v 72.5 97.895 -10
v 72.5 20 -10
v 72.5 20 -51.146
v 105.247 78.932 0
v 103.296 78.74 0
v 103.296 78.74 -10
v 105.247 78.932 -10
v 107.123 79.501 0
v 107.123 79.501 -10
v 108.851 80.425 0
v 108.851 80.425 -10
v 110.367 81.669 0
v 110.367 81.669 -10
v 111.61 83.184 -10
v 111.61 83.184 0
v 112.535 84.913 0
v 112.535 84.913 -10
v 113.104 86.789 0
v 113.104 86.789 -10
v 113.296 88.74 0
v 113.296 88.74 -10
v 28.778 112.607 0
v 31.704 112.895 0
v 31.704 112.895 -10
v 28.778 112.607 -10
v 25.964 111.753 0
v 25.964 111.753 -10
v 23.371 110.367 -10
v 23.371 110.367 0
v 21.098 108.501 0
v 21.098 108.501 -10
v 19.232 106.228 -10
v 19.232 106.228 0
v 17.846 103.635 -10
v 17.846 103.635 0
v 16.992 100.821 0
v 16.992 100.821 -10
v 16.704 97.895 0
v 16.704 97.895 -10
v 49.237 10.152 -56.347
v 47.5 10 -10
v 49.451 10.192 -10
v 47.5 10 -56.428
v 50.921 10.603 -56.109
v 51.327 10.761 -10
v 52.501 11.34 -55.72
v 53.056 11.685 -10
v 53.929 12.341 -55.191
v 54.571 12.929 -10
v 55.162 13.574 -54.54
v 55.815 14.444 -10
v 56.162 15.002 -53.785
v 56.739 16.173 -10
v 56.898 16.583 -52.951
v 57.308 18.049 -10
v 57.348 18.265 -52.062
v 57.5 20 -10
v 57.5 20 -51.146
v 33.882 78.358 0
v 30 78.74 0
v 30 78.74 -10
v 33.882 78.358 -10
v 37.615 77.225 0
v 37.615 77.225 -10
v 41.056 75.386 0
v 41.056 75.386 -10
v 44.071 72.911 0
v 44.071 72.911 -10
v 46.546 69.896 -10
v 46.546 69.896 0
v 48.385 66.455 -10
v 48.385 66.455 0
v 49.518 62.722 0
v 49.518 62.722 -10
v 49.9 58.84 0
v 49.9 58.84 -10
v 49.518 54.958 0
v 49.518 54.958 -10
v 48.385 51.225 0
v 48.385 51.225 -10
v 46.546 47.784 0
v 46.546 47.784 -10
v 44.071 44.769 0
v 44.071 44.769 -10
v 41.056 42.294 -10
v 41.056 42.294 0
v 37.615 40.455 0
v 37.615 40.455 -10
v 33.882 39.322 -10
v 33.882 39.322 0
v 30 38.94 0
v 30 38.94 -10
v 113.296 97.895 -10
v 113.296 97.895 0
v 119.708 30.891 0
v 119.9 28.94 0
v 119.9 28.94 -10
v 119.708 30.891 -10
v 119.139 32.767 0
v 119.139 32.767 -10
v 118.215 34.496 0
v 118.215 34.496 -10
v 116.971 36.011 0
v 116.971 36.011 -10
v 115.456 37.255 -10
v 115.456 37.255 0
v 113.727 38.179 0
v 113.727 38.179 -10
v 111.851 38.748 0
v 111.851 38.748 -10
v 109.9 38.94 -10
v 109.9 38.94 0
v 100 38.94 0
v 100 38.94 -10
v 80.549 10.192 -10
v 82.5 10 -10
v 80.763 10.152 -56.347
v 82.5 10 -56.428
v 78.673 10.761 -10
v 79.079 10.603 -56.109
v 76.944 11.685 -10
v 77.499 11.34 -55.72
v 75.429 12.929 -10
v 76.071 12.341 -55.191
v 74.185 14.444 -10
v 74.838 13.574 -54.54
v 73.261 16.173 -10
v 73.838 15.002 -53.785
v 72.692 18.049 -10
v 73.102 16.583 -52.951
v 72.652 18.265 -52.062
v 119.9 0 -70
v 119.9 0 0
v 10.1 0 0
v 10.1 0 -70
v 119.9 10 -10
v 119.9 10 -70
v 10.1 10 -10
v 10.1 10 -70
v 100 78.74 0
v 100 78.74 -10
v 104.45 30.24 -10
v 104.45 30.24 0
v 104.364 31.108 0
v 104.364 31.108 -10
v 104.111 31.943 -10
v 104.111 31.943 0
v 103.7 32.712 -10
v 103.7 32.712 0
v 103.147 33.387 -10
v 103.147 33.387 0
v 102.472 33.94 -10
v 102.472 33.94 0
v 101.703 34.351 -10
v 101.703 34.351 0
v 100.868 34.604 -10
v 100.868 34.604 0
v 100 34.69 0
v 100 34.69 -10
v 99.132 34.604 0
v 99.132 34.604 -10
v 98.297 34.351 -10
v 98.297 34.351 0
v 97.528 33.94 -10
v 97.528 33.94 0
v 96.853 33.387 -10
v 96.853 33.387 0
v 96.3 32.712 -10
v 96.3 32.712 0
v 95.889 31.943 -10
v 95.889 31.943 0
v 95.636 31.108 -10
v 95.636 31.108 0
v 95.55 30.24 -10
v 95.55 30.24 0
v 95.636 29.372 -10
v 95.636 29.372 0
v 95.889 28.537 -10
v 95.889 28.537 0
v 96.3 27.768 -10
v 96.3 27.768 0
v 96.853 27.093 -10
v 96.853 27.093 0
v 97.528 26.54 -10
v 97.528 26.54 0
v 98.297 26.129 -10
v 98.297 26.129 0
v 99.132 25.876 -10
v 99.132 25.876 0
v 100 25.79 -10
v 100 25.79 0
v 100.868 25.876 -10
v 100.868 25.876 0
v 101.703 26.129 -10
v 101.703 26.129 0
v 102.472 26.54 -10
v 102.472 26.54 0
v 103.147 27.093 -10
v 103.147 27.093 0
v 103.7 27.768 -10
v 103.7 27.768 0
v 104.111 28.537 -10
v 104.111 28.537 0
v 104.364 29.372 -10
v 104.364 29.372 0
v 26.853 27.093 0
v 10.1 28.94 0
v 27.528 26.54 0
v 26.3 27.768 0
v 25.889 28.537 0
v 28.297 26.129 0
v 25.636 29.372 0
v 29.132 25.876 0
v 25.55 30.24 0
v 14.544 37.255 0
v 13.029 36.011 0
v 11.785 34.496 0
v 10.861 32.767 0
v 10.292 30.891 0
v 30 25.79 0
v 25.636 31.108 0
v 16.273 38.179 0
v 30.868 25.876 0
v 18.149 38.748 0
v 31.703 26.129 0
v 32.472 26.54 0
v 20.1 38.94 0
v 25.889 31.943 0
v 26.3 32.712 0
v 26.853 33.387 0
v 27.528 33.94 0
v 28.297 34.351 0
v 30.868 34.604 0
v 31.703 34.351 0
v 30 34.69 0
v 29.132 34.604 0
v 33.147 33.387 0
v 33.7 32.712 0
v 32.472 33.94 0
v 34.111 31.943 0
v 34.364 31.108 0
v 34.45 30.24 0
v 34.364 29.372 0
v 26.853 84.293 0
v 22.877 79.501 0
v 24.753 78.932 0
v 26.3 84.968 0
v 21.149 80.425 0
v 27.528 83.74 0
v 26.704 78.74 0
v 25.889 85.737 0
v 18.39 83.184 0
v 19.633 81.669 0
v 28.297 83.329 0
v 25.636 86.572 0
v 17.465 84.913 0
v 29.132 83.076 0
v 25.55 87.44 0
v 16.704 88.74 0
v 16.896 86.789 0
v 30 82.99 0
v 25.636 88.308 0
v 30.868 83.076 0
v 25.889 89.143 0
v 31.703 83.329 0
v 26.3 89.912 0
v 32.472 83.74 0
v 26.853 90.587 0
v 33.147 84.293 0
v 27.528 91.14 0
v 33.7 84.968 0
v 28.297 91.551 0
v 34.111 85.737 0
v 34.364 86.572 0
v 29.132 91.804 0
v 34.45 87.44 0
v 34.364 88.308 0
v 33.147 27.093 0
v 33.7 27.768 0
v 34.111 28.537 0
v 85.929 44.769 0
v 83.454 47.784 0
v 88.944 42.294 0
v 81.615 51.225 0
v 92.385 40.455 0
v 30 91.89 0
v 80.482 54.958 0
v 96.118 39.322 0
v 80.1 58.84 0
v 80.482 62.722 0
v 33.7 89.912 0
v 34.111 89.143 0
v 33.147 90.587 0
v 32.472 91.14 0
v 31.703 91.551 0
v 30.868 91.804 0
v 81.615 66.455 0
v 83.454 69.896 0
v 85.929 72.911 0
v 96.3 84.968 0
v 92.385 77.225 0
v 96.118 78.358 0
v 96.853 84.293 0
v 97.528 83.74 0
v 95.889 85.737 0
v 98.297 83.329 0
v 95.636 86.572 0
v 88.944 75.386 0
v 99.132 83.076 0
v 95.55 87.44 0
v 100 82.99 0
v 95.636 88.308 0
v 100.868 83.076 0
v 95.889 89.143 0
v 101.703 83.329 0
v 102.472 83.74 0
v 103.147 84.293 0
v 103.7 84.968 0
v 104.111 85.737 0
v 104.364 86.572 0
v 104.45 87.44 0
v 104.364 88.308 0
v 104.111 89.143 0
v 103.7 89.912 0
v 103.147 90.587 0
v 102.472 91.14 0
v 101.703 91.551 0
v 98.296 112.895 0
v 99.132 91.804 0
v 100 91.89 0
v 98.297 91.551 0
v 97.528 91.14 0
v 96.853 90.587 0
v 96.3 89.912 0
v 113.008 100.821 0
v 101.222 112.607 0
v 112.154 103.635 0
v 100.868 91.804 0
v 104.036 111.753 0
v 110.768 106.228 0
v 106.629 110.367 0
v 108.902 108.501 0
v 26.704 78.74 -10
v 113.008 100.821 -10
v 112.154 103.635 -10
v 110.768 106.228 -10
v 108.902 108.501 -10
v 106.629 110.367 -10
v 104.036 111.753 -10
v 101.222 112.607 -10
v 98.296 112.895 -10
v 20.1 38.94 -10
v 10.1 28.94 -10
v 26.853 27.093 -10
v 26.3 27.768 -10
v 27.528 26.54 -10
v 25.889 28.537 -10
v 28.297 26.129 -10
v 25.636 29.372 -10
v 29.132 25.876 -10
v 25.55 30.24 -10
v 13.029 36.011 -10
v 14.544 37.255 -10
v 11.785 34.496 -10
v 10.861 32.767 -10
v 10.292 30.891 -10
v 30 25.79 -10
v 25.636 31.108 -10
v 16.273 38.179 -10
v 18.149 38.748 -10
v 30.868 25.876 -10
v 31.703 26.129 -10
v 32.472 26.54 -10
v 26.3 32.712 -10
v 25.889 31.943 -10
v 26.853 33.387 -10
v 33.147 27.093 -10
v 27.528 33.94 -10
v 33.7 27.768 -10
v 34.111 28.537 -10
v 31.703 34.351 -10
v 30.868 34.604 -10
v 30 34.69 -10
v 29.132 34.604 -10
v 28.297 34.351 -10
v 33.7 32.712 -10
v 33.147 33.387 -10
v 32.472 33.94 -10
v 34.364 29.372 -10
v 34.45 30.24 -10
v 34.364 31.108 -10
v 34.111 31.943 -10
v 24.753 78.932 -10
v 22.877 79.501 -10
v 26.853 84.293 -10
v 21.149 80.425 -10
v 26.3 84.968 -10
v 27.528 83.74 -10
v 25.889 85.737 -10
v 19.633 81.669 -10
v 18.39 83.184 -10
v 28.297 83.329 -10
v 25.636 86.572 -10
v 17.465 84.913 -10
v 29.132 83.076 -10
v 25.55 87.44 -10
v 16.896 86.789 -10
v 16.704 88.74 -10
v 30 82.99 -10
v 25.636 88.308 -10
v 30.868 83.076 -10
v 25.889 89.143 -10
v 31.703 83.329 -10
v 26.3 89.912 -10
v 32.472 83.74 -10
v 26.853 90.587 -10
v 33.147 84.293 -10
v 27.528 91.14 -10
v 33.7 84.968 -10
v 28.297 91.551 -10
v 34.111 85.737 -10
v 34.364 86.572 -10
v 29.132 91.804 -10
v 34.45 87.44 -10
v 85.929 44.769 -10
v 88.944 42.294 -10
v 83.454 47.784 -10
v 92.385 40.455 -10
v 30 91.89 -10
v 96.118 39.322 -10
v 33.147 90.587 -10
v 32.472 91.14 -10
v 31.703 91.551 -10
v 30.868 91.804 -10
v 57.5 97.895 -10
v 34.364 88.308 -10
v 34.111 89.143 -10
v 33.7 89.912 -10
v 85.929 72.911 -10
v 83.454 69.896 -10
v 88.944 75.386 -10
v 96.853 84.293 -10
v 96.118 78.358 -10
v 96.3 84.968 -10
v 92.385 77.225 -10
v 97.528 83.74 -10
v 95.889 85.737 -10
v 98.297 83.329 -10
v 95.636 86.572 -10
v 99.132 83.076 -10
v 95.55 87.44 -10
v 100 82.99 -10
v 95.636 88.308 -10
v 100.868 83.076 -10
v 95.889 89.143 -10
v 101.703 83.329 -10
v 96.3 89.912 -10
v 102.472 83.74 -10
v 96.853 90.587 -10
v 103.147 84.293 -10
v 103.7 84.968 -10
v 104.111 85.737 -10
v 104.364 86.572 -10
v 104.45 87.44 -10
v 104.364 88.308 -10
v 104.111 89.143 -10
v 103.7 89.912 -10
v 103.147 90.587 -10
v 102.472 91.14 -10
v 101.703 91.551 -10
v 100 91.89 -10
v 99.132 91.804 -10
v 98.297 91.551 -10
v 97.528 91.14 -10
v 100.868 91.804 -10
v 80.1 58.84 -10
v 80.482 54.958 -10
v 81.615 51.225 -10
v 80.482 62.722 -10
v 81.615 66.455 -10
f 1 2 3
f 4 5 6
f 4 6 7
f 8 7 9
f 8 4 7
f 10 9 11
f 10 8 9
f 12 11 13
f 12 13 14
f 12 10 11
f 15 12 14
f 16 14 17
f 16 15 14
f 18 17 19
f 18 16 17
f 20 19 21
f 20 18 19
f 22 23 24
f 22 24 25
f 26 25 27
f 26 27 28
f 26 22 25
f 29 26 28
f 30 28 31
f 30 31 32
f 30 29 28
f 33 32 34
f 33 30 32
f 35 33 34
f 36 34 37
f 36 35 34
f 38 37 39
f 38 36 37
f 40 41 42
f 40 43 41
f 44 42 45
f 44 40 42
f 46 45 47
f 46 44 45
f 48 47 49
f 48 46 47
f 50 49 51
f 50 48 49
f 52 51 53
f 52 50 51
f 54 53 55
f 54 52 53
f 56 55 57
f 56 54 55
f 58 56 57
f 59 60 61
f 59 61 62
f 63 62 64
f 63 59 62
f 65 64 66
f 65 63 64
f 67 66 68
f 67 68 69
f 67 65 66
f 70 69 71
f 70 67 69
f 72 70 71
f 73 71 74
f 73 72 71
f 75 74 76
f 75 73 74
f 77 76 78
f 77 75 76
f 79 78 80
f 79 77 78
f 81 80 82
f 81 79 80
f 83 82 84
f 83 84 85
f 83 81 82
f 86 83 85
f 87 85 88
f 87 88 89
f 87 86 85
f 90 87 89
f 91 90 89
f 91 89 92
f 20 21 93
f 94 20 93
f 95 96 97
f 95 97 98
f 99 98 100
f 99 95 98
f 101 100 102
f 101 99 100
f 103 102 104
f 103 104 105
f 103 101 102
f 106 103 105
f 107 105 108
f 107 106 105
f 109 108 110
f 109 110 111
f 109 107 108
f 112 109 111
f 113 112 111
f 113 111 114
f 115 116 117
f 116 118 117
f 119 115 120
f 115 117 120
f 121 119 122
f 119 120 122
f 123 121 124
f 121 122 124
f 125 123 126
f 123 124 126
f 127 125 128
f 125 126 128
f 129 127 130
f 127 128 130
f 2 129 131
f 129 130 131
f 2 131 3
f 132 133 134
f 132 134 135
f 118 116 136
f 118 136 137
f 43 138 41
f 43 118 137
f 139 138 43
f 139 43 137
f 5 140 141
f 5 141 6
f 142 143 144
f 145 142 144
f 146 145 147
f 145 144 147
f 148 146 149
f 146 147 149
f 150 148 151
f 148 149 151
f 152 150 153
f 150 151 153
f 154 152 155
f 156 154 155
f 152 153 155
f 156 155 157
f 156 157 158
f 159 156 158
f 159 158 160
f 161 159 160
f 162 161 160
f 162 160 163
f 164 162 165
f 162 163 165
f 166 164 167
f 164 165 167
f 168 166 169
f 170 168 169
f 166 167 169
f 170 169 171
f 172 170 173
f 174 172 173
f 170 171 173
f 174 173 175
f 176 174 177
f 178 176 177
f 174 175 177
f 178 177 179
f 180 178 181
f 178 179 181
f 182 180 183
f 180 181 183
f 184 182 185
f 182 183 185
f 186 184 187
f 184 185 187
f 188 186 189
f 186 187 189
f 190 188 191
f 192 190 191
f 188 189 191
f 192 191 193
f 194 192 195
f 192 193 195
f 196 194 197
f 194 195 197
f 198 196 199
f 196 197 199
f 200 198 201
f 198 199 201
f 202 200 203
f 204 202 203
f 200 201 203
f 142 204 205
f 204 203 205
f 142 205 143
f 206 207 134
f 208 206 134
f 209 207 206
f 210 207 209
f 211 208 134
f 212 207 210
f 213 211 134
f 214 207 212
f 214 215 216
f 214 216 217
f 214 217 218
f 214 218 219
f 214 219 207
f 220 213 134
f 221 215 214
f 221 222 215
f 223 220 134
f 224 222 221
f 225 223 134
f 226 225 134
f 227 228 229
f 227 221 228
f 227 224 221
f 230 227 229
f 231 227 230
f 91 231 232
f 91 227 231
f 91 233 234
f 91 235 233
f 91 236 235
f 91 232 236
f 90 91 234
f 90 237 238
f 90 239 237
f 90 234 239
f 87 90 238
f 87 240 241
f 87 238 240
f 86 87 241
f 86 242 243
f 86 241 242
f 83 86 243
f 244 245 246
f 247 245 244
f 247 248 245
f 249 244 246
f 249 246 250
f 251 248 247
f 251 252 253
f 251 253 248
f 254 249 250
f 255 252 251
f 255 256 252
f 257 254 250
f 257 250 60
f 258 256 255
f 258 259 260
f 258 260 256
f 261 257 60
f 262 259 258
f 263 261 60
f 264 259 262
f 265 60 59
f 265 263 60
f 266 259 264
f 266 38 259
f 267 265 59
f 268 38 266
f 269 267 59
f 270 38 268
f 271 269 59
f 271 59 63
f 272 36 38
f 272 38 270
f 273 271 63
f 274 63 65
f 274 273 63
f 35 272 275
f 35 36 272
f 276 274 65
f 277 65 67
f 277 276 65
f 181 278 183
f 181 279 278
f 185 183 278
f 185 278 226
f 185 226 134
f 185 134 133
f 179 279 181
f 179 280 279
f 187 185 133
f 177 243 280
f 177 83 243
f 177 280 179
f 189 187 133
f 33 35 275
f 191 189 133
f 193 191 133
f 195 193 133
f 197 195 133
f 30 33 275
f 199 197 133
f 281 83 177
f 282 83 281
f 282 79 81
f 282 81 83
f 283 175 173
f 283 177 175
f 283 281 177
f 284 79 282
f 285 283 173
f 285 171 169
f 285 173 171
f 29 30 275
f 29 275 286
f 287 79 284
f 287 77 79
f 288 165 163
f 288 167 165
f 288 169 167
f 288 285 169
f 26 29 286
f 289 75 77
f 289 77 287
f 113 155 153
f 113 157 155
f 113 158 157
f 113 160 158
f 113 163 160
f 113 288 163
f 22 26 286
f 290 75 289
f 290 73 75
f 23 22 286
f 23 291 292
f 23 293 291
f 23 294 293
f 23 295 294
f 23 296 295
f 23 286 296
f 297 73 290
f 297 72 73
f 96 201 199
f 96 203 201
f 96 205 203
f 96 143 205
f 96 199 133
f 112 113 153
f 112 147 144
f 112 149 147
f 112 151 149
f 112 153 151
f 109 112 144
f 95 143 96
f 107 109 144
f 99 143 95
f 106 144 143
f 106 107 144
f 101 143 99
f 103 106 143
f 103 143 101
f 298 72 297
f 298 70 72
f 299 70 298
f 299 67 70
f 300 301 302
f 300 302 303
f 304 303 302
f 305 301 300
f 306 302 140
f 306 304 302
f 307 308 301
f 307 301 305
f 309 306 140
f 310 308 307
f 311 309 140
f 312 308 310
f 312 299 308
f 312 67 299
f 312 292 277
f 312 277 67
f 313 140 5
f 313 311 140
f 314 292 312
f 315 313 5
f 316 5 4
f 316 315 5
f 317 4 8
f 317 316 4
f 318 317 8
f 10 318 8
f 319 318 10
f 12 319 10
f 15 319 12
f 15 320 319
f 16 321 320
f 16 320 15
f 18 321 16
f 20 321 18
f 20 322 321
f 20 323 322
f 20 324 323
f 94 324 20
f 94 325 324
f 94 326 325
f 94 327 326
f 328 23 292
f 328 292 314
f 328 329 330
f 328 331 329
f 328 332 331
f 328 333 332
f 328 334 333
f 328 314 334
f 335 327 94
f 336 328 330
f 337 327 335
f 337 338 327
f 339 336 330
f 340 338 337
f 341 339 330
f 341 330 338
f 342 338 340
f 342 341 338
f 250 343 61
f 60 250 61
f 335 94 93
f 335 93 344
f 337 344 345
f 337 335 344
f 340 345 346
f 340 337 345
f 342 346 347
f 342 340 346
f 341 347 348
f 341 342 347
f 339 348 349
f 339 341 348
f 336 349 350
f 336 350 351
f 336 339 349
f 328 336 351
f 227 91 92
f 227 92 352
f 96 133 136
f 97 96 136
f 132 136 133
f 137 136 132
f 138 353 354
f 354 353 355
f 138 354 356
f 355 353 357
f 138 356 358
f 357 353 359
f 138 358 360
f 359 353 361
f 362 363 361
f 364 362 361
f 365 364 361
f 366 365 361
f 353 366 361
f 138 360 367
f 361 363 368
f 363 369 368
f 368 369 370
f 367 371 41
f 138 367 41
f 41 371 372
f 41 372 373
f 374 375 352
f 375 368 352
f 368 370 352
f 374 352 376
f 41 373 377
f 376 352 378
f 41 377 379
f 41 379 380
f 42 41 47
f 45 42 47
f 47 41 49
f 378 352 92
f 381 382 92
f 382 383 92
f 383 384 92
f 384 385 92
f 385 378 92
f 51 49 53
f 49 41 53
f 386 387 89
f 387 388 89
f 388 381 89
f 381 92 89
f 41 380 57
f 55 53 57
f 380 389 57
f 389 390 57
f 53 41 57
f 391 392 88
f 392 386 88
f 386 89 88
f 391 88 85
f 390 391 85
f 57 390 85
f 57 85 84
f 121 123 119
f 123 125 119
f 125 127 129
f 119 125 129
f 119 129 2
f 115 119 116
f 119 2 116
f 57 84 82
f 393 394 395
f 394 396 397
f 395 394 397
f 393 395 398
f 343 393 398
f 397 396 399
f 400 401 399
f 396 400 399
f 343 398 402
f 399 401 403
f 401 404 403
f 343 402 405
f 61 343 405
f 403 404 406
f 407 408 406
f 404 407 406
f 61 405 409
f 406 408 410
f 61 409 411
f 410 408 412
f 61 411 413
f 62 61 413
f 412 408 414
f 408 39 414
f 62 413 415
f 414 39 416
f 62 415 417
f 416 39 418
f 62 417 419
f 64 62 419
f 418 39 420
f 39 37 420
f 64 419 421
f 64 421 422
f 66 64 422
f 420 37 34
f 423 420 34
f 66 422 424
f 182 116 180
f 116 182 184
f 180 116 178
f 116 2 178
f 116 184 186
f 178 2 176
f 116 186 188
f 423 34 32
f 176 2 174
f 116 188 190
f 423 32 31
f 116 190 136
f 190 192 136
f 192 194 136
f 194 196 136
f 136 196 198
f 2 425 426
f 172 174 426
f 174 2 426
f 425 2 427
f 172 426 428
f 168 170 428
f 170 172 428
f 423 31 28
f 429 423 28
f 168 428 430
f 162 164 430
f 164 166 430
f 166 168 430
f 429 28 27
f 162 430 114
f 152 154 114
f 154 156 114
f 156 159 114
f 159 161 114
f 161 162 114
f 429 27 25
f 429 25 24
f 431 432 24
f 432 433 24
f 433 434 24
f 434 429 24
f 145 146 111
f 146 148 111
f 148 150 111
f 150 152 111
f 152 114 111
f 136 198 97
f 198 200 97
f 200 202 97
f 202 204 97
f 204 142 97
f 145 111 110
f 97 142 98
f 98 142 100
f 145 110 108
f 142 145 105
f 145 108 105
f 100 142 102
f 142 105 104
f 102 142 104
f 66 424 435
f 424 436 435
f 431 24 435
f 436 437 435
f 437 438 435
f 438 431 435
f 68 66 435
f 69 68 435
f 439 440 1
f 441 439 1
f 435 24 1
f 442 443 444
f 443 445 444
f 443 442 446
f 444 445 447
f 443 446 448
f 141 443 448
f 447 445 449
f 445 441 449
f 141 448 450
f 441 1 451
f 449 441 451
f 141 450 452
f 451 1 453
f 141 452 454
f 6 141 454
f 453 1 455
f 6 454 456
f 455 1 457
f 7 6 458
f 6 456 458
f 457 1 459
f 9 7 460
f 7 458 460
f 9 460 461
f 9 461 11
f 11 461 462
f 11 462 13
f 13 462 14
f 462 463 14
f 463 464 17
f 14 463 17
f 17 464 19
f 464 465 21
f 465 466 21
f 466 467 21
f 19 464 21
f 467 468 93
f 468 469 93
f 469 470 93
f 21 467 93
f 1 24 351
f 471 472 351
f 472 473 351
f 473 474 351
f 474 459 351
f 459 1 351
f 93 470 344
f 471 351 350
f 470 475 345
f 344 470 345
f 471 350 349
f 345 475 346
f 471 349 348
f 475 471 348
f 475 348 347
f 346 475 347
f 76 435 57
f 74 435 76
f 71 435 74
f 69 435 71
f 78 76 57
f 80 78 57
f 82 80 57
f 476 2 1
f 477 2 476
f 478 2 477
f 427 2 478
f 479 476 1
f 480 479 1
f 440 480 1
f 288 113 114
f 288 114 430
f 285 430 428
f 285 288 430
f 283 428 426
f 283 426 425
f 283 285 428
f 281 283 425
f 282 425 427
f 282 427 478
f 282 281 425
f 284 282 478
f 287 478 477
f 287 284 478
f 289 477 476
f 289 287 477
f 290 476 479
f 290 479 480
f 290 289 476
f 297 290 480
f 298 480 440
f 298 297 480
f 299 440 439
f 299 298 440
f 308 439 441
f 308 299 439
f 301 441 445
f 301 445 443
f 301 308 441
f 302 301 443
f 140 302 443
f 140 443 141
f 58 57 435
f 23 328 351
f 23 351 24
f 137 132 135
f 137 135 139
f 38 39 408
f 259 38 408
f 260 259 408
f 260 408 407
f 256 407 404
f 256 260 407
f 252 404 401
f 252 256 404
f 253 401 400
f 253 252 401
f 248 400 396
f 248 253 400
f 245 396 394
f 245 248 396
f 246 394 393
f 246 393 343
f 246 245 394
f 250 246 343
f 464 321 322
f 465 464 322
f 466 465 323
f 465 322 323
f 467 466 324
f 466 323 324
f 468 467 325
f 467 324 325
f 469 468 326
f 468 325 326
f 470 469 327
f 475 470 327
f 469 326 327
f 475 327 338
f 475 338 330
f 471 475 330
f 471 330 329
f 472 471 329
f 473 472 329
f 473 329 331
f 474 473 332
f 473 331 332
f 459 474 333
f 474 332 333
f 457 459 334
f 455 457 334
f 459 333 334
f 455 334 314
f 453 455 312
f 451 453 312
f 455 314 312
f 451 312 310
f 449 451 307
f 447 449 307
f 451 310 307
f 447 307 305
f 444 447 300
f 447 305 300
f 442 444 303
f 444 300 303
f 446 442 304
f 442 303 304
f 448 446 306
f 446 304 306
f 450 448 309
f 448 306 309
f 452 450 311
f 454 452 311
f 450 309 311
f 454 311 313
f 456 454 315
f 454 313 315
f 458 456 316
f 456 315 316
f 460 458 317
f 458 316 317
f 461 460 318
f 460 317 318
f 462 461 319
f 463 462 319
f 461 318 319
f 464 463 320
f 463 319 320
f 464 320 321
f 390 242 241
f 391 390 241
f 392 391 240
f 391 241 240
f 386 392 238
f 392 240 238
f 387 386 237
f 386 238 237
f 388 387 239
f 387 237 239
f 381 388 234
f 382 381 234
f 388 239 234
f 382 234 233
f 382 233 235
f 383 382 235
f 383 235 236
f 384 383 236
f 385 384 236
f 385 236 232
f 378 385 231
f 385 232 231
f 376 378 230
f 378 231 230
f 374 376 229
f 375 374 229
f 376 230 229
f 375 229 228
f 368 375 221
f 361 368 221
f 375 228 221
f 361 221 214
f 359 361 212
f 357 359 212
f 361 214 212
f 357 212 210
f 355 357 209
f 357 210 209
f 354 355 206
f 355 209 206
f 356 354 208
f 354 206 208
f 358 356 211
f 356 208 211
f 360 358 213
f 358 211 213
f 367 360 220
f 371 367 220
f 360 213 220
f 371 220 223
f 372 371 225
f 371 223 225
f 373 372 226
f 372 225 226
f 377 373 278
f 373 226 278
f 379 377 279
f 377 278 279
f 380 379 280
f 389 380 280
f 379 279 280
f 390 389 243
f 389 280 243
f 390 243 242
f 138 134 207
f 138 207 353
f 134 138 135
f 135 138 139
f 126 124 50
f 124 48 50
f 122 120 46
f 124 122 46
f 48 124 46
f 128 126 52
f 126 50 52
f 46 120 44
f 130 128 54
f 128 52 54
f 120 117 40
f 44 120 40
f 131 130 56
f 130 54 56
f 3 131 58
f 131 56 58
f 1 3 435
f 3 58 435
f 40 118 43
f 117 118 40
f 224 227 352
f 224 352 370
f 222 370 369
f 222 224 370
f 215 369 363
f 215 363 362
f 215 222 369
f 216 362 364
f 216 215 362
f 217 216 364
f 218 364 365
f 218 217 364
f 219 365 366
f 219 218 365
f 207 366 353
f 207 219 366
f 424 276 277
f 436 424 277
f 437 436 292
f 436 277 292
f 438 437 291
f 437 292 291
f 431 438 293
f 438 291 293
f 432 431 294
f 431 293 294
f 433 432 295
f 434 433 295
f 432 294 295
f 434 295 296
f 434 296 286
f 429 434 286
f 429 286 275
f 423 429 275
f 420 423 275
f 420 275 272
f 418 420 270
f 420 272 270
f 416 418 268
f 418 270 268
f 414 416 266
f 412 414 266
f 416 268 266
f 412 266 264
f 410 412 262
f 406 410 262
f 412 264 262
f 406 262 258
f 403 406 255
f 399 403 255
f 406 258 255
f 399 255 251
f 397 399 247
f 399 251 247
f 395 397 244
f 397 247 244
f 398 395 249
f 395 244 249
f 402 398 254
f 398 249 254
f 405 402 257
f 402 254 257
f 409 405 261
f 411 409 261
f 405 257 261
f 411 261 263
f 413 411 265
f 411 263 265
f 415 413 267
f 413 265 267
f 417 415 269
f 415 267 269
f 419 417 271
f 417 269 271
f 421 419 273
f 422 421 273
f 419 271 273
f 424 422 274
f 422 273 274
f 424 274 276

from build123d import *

# Parameters (mm, degrees)
SKETCH1_R           = 4.45
BOSS_EXTRUDE1_DEPTH = 10
BOSS_EXTRUDE2_START = 10.1
SKETCH2_W           = 60
SKETCH2_H           = 10
BOSS_EXTRUDE2_DEPTH = 109.8
BOSS_EXTRUDE3_DEPTH = 7.5
FILLET1_R           = 10
FILLET2_R           = 10


with BuildPart() as part:
    # Sketch1 → Boss-Extrude1 (new body)
    with BuildSketch(Plane.XY):
        with BuildLine():
            Line((62.029952175, 0), (119.9, 0))
            Line((119.9, 0), (119.9, 28.94))
            ThreePointArc((119.9, 28.94), (116.971067812, 36.011067812), (109.9, 38.94))
            Line((109.9, 38.94), (100, 38.94))
            ThreePointArc((100, 38.94), (80.1, 58.84), (100, 78.74))
            Line((100, 78.74), (103.295753204, 78.74))
            ThreePointArc((103.295753204, 78.74), (110.366821016, 81.668932188), (113.295753204, 88.74))
            Line((113.295753204, 88.74), (113.295753204, 97.89474782))
            ThreePointArc((113.295753204, 97.89474782), (108.902354922, 108.501349538), (98.295753204, 112.89474782))
            Line((98.295753204, 112.89474782), (31.704246796, 112.89474782))
            ThreePointArc((31.704246796, 112.89474782), (21.097645078, 108.501349538), (16.704246796, 97.89474782))
            Line((16.704246796, 97.89474782), (16.704246796, 88.74))
            ThreePointArc((16.704246796, 88.74), (19.633178984, 81.668932188), (26.704246796, 78.74))
            Line((26.704246796, 78.74), (30, 78.74))
            ThreePointArc((30, 78.74), (49.9, 58.84), (30, 38.94))
            Line((30, 38.94), (20.1, 38.94))
            ThreePointArc((20.1, 38.94), (13.028932188, 36.011067812), (10.1, 28.94))
            Line((10.1, 28.94), (10.1, 0))
            Line((10.1, 0), (62.029952175, 0))
        make_face()
        with Locations((30, 30.24)):
            Circle(SKETCH1_R, mode=Mode.SUBTRACT)
        with Locations((30, 87.44)):
            Circle(SKETCH1_R, mode=Mode.SUBTRACT)
        with Locations((100, 30.24)):
            Circle(SKETCH1_R, mode=Mode.SUBTRACT)
        with Locations((100, 87.44)):
            Circle(SKETCH1_R, mode=Mode.SUBTRACT)
    extrude(amount=-BOSS_EXTRUDE1_DEPTH)

    # Sketch2 → Boss-Extrude2 (add)
    with BuildSketch(Plane(origin=(0, 0, 0), x_dir=(0, 0, -1), z_dir=(1, 0, 0)).offset(BOSS_EXTRUDE2_START)):
        with Locations((40, 5)):
            Rectangle(SKETCH2_W, SKETCH2_H)
    extrude(amount=BOSS_EXTRUDE2_DEPTH)

    # Sketch3 → Boss-Extrude3 (add, symmetric)
    with BuildSketch(Plane.ZY.offset(-65)):
        Polygon((-10, 97.89474782), (-10, 10), (-56.427715737, 10), align=None)
    extrude(amount=BOSS_EXTRUDE3_DEPTH, both=True)

    # Fillet1
    fillet1_edges = [part.edges().sort_by_distance(p)[0] for p in [
        (72.5, 10, -33.213857868),
    ]]
    fillet(fillet1_edges, radius=FILLET1_R)

    # Fillet2
    fillet2_edges = [part.edges().sort_by_distance(p)[0] for p in [
        (57.5, 10, -33.213857868),
    ]]
    fillet(fillet2_edges, radius=FILLET2_R)


solid = part.part
